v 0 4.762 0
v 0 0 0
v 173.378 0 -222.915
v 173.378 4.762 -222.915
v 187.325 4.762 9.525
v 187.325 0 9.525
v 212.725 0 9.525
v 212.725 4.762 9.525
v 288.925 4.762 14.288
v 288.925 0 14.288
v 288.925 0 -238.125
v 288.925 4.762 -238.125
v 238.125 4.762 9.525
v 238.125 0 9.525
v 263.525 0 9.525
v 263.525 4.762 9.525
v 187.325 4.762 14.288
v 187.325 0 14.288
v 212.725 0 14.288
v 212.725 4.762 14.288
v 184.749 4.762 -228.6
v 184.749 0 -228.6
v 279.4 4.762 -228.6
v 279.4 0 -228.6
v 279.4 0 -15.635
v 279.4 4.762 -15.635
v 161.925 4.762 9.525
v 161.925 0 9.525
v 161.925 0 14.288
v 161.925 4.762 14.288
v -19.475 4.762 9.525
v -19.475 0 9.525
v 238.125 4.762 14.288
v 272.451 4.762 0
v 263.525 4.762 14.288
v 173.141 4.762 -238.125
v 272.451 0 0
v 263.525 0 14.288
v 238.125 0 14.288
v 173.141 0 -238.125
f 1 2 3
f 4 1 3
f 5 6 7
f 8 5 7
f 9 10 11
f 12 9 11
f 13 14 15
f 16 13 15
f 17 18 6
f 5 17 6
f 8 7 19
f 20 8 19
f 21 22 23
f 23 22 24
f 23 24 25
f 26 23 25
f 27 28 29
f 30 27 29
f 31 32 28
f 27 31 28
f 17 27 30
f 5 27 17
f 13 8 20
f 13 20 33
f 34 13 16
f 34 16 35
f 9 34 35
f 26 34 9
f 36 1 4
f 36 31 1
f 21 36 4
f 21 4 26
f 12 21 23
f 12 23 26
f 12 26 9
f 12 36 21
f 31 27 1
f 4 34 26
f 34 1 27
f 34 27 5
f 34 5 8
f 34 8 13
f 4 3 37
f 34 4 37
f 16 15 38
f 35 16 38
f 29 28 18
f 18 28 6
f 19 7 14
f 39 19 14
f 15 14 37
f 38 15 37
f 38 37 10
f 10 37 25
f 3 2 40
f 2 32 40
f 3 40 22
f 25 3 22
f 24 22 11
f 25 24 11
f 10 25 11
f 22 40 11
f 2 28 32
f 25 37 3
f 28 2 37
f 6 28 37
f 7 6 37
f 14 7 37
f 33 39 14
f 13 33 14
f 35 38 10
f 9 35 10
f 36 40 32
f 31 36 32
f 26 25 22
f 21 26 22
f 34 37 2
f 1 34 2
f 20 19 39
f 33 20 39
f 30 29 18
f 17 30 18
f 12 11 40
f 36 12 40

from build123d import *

# Parameters (mm, degrees)
BOSS_EXTRUDE1_DEPTH = 4.7625


with BuildPart() as part:
    # Sketch1 → Boss-Extrude1 (new body)
    with BuildSketch(Plane(origin=(0, 0, 0), x_dir=(1, 0, 0), z_dir=(0, 1, 0))):
        Polygon((-19.475189916, -9.525), (161.925, -9.525), (161.925, -14.2875), (187.325, -14.2875), (187.325, -9.525), (212.725, -9.525), (212.725, -14.2875), (238.125, -14.2875), (238.125, -9.525), (263.525, -9.525), (263.525, -14.2875), (288.925, -14.2875), (288.925, 238.125), (173.141476751, 238.125), align=None)
        Polygon((272.451083662, 0), (0, 0), (173.37796233, 222.914522996), align=None, mode=Mode.SUBTRACT)
        Polygon((184.748916338, 228.6), (279.4, 228.6), (279.4, 15.63506176), align=None, mode=Mode.SUBTRACT)
    extrude(amount=BOSS_EXTRUDE1_DEPTH)


solid = part.part
